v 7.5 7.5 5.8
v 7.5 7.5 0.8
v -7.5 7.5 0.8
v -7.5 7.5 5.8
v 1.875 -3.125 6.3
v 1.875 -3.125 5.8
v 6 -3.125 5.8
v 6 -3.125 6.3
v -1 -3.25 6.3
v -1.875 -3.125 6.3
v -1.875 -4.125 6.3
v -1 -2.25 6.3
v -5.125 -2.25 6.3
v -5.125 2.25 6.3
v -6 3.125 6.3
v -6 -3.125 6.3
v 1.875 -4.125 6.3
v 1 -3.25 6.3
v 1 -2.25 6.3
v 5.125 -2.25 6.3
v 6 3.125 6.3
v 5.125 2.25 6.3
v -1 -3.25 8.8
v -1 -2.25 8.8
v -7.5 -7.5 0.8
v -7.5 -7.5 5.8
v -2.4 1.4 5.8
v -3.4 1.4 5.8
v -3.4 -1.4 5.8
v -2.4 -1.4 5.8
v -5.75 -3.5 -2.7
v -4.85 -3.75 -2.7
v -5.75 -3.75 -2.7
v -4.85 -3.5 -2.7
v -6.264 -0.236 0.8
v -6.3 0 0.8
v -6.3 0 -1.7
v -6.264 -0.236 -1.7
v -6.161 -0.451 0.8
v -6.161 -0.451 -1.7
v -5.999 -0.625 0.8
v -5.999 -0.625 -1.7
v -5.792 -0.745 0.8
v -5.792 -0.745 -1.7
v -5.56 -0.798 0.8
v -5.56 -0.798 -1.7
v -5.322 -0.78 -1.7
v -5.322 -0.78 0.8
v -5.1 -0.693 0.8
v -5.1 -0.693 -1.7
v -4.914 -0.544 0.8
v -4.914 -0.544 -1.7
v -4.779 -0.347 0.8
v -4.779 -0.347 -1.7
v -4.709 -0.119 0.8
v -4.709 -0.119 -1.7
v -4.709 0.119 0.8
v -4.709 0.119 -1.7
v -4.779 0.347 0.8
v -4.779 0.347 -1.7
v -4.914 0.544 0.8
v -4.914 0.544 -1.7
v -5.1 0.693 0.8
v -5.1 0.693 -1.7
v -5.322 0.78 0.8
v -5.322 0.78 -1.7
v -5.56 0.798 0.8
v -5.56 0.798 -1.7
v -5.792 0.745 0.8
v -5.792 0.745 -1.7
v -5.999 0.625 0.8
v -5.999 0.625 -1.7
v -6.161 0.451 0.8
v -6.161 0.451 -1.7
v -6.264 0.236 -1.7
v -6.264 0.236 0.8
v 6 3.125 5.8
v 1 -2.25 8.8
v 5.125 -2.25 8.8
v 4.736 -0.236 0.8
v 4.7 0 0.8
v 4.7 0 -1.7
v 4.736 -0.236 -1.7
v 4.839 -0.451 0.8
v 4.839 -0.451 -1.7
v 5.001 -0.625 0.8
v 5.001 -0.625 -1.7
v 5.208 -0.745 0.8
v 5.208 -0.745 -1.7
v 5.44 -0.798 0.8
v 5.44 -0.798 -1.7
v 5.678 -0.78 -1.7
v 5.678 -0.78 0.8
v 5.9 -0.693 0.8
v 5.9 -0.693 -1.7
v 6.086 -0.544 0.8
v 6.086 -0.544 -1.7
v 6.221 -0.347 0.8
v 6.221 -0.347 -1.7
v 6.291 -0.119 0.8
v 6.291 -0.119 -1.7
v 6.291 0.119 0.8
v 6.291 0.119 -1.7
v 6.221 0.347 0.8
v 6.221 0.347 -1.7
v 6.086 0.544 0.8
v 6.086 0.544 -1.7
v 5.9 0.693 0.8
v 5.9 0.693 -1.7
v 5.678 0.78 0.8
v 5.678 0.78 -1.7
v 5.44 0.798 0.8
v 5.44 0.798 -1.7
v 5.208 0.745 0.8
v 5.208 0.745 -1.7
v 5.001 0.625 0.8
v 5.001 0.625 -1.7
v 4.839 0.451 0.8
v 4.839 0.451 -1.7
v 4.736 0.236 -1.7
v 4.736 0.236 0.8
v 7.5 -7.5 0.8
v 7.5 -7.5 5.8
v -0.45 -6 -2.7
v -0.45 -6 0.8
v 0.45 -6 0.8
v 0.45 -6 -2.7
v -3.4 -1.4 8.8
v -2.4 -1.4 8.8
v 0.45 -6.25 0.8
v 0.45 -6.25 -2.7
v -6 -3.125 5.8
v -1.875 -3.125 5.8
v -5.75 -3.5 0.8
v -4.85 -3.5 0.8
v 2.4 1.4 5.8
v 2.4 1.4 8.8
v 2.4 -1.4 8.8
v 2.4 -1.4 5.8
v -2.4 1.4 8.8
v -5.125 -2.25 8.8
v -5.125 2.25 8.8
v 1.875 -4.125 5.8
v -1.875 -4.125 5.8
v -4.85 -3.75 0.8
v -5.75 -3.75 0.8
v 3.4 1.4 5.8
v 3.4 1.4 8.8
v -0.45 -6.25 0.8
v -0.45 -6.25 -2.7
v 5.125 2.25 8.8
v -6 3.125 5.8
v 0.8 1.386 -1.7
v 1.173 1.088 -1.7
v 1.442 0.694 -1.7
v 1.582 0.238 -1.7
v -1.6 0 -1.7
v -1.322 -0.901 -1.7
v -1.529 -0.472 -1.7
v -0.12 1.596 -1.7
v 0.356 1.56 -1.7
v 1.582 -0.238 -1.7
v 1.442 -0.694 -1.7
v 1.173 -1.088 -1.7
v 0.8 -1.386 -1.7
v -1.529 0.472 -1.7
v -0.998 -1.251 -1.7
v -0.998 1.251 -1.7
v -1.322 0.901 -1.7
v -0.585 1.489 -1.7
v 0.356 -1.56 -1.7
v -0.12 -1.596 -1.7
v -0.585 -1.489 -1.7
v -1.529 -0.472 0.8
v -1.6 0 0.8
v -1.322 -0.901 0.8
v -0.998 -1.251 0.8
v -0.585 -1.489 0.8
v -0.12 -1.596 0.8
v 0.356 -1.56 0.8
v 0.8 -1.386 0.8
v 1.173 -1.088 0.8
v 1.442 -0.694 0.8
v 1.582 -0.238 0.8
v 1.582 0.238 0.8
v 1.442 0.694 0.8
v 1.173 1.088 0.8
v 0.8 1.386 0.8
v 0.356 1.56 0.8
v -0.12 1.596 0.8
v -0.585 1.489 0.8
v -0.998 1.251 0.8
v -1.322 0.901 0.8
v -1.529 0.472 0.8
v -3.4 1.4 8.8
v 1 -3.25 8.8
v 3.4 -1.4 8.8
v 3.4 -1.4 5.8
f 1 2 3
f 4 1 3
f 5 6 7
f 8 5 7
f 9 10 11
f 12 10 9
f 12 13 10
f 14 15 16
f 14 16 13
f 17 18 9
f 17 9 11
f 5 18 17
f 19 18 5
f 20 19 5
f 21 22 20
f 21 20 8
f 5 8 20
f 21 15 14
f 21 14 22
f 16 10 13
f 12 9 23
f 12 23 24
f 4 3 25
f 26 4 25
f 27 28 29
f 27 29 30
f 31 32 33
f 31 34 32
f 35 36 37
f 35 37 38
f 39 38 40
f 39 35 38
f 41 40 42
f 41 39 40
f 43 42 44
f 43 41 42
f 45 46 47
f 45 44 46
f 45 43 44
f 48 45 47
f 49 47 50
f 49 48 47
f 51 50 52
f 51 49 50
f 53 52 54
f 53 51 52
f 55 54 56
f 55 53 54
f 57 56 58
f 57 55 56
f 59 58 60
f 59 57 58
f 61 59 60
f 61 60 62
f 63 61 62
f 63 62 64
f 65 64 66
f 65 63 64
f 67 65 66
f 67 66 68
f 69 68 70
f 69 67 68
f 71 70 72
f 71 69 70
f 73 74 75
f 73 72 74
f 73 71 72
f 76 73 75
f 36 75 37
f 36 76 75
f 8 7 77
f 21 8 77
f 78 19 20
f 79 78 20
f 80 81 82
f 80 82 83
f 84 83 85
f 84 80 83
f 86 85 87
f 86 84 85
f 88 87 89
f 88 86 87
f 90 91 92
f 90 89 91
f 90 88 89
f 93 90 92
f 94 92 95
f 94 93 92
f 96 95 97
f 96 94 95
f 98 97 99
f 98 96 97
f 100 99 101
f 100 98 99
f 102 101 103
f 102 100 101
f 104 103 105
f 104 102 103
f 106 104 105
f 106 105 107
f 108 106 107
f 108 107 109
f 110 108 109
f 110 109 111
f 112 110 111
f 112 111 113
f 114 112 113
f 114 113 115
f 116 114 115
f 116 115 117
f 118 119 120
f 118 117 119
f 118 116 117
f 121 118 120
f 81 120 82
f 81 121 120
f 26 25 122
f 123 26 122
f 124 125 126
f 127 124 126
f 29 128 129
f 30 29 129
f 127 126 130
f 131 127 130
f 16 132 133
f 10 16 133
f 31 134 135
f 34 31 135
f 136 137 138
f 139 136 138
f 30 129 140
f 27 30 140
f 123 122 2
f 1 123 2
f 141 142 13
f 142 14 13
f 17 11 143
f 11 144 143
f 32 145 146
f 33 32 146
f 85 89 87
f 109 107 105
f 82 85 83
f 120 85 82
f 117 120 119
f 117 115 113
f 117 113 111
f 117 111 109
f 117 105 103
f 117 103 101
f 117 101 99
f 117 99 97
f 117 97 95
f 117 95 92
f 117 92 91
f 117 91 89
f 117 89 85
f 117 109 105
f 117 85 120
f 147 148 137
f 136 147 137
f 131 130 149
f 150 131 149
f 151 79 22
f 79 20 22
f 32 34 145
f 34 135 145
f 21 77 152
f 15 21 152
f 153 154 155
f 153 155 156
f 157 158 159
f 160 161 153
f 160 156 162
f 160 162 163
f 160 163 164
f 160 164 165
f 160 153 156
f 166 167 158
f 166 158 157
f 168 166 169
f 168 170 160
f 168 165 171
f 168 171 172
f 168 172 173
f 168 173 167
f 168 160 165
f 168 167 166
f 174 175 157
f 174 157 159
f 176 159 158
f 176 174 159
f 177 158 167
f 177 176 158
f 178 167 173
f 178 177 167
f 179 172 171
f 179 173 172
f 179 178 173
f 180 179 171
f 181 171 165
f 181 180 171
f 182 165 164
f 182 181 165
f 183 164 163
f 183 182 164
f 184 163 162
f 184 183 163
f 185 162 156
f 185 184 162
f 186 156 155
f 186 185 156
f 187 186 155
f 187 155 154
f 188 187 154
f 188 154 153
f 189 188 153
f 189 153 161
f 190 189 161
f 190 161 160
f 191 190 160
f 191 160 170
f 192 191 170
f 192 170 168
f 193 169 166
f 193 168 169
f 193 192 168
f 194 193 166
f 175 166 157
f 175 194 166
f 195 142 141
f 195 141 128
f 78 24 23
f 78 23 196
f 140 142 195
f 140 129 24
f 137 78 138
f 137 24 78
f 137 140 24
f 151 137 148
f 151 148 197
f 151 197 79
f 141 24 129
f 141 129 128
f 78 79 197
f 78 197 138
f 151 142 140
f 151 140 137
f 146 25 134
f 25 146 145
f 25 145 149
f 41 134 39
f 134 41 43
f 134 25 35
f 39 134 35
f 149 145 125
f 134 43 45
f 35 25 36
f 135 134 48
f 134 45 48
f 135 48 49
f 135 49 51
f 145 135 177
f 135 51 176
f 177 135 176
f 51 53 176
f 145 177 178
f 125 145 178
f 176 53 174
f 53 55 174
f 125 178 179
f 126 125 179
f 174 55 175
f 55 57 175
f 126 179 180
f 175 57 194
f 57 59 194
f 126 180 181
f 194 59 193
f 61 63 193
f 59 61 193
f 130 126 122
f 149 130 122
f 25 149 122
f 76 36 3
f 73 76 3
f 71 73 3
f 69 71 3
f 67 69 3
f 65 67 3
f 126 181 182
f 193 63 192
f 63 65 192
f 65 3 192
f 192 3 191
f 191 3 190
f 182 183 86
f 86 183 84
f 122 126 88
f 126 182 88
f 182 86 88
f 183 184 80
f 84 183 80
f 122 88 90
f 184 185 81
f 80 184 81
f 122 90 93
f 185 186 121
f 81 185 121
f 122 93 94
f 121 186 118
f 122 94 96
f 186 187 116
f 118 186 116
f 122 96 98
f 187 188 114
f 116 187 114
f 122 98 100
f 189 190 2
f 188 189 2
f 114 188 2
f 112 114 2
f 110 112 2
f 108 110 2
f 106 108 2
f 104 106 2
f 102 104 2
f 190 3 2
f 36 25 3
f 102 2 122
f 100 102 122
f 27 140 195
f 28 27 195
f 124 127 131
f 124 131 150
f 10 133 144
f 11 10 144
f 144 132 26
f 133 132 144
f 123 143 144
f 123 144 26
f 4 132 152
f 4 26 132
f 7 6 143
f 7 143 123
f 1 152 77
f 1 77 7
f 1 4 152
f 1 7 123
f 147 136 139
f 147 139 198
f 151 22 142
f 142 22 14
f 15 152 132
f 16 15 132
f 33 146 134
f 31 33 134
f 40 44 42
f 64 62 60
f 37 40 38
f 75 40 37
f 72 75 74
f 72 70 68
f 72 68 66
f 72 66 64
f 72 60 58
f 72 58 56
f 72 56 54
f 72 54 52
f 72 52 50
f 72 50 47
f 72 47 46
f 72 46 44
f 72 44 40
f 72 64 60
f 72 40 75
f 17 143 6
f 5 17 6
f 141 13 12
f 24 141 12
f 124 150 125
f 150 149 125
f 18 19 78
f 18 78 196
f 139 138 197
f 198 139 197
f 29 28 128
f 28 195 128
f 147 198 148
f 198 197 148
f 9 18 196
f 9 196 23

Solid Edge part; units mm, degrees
sketch "Sketch1" plane through (0, 0, 0) normal (0, 0, 1) x (1, 0, 0)
  line L0 (11.5, -10) -> (11.5, 10)
  line L1 (11.5, 10) -> (-11.5, 10)
  line L2 (-11.5, 10) -> (-11.5, -10)
  line L3 (-11.5, -10) -> (11.5, -10)
extrude "Protrusion1" add sketch "Sketch1" along normal mid plane 1.6
sketch "Sketch2" plane through (0, 0, 0.8) normal (0, 0, 1) x (1, 0, 0)
  line L0 (7.5, -7.5) -> (7.5, 7.5)
  line L1 (7.5, 7.5) -> (-7.5, 7.5)
  line L2 (-7.5, 7.5) -> (-7.5, -7.5)
  line L3 (-7.5, -7.5) -> (7.5, -7.5)
extrude "ExtrudedCutout_1" add sketch "Sketch2" along normal blind 5
sketch "Sketch3" plane through (0, 0, 5.8) normal (0, 0, 1) x (1, 0, 0)
  line L0 (1, -3.25) -> (-1, -3.25)
  line L1 (-1, -3.25) -> (-1, -2.25)
  line L2 (-1, -2.25) -> (1, -2.25)
  line L3 (1, -2.25) -> (1, -3.25)
  line L4 (-5.125, -2.25) -> (5.125, -2.25)
  line L5 (5.125, -2.25) -> (5.125, 2.25)
  line L6 (5.125, 2.25) -> (-5.125, 2.25)
  line L7 (-5.125, 2.25) -> (-5.125, -2.25)
  dimension "D1" = 10.25
  dimension "D2" = 4.5
  dimension "D3" = 2
  dimension "D4" = 1
extrude "ExtrudedProtrusion_3" add sketch "Sketch3" along normal blind 3
sketch "Sketch4" plane through (0, 0, 5.8) normal (0, 0, 1) x (1, 0, 0)
  line L0 (1, -2.25) -> (1, -3.25)
  line L1 (1, -3.25) -> (-1, -3.25)
  line L2 (-1, -3.25) -> (-1, -2.25)
  line L3 (-5.125, -2.25) -> (-1, -2.25)
  line L4 (-5.125, 2.25) -> (-5.125, -2.25)
  line L5 (5.125, 2.25) -> (-5.125, 2.25)
  line L6 (5.125, -2.25) -> (5.125, 2.25)
  line L7 (1, -2.25) -> (5.125, -2.25)
  line L8 (1.875, -4.125) -> (1.875, -3.125)
  line L9 (1.875, -3.125) -> (6, -3.125)
  line L10 (6, -3.125) -> (6, 3.125)
  line L11 (6, 3.125) -> (-6, 3.125)
  line L12 (-6, 3.125) -> (-6, -3.125)
  line L13 (-6, -3.125) -> (-1.875, -3.125)
  line L14 (-1.875, -3.125) -> (-1.875, -4.125)
  line L15 (-1.875, -4.125) -> (1.875, -4.125)
  dimension "D1" = 12
extrude "ExtrudedProtrusion_4" add sketch "Sketch4" along normal blind 0.5
sketch "Sketch5" plane through (0, -0.5, 8.8) normal (0, 0, 1) x (1, 0, 0)
  line L0 (-3.4, 1.9) -> (-3.4, -0.9)
  line L1 (-3.4, -0.9) -> (-2.4, -0.9)
  line L2 (-2.4, -0.9) -> (-2.4, 1.9)
  line L3 (-2.4, 1.9) -> (-3.4, 1.9)
  line L4 (3.4, -0.9) -> (3.4, 1.9)
  line L5 (3.4, 1.9) -> (2.4, 1.9)
  line L6 (2.4, 1.9) -> (2.4, -0.9)
  line L7 (2.4, -0.9) -> (3.4, -0.9)
  dimension "D1" = 1
  dimension "D2" = 2.8
  dimension "D3" = 6.8
extrude "Cutout1" cut sketch "Sketch5" against normal up to vertex (3 mm away)
sketch "Sketch6" plane through (0, 0, -0.8) normal (0, 0, -1) x (0, -1, 0)
  line L0 (10, 11.5) -> (10, -11.5)
  line L1 (10, -11.5) -> (-10, -11.5)
  line L2 (-10, -11.5) -> (-10, 11.5)
  line L3 (-10, 11.5) -> (10, 11.5)
extrude "Cutout2" cut sketch "Sketch6" against normal up to vertex (1.6 mm away)
sketch "Sketch7" plane through (0, 0, 0.8) normal (0, 0, -1) x (-1, 0, 0)
  circle A0 centre (-5.5, 0) radius 0.8
  circle A1 centre (0, 0) radius 1.6
  circle A2 centre (5.5, 0) radius 0.8
  dimension "D1" = 1.6
  dimension "D2" = 3.2
  dimension "D3" = 5.5
extrude "ExtrudedProtrusion_5" add sketch "Sketch7" along normal blind 2.5
sketch "Sketch8" plane through (0, 0, 0.8) normal (0, 0, -1) x (1, 0, 0)
  line L0 (-0.45, 6) -> (0.45, 6)
  line L1 (0.45, 6) -> (0.45, 6.25)
  line L2 (0.45, 6.25) -> (-0.45, 6.25)
  line L3 (-0.45, 6.25) -> (-0.45, 6)
  line L4 (-4.85, 3.75) -> (-5.75, 3.75)
  line L5 (-5.75, 3.75) -> (-5.75, 3.5)
  line L6 (-5.75, 3.5) -> (-4.85, 3.5)
  line L7 (-4.85, 3.5) -> (-4.85, 3.75)
  dimension "D1" = 0.9
  dimension "D2" = 0.25
  dimension "D3" = 6
  dimension "D4" = 4.4
  dimension "D5" = 3.5
extrude "ExtrudedProtrusion_6" add sketch "Sketch8" along normal blind 3.5
properties material "Polycarbonate"
